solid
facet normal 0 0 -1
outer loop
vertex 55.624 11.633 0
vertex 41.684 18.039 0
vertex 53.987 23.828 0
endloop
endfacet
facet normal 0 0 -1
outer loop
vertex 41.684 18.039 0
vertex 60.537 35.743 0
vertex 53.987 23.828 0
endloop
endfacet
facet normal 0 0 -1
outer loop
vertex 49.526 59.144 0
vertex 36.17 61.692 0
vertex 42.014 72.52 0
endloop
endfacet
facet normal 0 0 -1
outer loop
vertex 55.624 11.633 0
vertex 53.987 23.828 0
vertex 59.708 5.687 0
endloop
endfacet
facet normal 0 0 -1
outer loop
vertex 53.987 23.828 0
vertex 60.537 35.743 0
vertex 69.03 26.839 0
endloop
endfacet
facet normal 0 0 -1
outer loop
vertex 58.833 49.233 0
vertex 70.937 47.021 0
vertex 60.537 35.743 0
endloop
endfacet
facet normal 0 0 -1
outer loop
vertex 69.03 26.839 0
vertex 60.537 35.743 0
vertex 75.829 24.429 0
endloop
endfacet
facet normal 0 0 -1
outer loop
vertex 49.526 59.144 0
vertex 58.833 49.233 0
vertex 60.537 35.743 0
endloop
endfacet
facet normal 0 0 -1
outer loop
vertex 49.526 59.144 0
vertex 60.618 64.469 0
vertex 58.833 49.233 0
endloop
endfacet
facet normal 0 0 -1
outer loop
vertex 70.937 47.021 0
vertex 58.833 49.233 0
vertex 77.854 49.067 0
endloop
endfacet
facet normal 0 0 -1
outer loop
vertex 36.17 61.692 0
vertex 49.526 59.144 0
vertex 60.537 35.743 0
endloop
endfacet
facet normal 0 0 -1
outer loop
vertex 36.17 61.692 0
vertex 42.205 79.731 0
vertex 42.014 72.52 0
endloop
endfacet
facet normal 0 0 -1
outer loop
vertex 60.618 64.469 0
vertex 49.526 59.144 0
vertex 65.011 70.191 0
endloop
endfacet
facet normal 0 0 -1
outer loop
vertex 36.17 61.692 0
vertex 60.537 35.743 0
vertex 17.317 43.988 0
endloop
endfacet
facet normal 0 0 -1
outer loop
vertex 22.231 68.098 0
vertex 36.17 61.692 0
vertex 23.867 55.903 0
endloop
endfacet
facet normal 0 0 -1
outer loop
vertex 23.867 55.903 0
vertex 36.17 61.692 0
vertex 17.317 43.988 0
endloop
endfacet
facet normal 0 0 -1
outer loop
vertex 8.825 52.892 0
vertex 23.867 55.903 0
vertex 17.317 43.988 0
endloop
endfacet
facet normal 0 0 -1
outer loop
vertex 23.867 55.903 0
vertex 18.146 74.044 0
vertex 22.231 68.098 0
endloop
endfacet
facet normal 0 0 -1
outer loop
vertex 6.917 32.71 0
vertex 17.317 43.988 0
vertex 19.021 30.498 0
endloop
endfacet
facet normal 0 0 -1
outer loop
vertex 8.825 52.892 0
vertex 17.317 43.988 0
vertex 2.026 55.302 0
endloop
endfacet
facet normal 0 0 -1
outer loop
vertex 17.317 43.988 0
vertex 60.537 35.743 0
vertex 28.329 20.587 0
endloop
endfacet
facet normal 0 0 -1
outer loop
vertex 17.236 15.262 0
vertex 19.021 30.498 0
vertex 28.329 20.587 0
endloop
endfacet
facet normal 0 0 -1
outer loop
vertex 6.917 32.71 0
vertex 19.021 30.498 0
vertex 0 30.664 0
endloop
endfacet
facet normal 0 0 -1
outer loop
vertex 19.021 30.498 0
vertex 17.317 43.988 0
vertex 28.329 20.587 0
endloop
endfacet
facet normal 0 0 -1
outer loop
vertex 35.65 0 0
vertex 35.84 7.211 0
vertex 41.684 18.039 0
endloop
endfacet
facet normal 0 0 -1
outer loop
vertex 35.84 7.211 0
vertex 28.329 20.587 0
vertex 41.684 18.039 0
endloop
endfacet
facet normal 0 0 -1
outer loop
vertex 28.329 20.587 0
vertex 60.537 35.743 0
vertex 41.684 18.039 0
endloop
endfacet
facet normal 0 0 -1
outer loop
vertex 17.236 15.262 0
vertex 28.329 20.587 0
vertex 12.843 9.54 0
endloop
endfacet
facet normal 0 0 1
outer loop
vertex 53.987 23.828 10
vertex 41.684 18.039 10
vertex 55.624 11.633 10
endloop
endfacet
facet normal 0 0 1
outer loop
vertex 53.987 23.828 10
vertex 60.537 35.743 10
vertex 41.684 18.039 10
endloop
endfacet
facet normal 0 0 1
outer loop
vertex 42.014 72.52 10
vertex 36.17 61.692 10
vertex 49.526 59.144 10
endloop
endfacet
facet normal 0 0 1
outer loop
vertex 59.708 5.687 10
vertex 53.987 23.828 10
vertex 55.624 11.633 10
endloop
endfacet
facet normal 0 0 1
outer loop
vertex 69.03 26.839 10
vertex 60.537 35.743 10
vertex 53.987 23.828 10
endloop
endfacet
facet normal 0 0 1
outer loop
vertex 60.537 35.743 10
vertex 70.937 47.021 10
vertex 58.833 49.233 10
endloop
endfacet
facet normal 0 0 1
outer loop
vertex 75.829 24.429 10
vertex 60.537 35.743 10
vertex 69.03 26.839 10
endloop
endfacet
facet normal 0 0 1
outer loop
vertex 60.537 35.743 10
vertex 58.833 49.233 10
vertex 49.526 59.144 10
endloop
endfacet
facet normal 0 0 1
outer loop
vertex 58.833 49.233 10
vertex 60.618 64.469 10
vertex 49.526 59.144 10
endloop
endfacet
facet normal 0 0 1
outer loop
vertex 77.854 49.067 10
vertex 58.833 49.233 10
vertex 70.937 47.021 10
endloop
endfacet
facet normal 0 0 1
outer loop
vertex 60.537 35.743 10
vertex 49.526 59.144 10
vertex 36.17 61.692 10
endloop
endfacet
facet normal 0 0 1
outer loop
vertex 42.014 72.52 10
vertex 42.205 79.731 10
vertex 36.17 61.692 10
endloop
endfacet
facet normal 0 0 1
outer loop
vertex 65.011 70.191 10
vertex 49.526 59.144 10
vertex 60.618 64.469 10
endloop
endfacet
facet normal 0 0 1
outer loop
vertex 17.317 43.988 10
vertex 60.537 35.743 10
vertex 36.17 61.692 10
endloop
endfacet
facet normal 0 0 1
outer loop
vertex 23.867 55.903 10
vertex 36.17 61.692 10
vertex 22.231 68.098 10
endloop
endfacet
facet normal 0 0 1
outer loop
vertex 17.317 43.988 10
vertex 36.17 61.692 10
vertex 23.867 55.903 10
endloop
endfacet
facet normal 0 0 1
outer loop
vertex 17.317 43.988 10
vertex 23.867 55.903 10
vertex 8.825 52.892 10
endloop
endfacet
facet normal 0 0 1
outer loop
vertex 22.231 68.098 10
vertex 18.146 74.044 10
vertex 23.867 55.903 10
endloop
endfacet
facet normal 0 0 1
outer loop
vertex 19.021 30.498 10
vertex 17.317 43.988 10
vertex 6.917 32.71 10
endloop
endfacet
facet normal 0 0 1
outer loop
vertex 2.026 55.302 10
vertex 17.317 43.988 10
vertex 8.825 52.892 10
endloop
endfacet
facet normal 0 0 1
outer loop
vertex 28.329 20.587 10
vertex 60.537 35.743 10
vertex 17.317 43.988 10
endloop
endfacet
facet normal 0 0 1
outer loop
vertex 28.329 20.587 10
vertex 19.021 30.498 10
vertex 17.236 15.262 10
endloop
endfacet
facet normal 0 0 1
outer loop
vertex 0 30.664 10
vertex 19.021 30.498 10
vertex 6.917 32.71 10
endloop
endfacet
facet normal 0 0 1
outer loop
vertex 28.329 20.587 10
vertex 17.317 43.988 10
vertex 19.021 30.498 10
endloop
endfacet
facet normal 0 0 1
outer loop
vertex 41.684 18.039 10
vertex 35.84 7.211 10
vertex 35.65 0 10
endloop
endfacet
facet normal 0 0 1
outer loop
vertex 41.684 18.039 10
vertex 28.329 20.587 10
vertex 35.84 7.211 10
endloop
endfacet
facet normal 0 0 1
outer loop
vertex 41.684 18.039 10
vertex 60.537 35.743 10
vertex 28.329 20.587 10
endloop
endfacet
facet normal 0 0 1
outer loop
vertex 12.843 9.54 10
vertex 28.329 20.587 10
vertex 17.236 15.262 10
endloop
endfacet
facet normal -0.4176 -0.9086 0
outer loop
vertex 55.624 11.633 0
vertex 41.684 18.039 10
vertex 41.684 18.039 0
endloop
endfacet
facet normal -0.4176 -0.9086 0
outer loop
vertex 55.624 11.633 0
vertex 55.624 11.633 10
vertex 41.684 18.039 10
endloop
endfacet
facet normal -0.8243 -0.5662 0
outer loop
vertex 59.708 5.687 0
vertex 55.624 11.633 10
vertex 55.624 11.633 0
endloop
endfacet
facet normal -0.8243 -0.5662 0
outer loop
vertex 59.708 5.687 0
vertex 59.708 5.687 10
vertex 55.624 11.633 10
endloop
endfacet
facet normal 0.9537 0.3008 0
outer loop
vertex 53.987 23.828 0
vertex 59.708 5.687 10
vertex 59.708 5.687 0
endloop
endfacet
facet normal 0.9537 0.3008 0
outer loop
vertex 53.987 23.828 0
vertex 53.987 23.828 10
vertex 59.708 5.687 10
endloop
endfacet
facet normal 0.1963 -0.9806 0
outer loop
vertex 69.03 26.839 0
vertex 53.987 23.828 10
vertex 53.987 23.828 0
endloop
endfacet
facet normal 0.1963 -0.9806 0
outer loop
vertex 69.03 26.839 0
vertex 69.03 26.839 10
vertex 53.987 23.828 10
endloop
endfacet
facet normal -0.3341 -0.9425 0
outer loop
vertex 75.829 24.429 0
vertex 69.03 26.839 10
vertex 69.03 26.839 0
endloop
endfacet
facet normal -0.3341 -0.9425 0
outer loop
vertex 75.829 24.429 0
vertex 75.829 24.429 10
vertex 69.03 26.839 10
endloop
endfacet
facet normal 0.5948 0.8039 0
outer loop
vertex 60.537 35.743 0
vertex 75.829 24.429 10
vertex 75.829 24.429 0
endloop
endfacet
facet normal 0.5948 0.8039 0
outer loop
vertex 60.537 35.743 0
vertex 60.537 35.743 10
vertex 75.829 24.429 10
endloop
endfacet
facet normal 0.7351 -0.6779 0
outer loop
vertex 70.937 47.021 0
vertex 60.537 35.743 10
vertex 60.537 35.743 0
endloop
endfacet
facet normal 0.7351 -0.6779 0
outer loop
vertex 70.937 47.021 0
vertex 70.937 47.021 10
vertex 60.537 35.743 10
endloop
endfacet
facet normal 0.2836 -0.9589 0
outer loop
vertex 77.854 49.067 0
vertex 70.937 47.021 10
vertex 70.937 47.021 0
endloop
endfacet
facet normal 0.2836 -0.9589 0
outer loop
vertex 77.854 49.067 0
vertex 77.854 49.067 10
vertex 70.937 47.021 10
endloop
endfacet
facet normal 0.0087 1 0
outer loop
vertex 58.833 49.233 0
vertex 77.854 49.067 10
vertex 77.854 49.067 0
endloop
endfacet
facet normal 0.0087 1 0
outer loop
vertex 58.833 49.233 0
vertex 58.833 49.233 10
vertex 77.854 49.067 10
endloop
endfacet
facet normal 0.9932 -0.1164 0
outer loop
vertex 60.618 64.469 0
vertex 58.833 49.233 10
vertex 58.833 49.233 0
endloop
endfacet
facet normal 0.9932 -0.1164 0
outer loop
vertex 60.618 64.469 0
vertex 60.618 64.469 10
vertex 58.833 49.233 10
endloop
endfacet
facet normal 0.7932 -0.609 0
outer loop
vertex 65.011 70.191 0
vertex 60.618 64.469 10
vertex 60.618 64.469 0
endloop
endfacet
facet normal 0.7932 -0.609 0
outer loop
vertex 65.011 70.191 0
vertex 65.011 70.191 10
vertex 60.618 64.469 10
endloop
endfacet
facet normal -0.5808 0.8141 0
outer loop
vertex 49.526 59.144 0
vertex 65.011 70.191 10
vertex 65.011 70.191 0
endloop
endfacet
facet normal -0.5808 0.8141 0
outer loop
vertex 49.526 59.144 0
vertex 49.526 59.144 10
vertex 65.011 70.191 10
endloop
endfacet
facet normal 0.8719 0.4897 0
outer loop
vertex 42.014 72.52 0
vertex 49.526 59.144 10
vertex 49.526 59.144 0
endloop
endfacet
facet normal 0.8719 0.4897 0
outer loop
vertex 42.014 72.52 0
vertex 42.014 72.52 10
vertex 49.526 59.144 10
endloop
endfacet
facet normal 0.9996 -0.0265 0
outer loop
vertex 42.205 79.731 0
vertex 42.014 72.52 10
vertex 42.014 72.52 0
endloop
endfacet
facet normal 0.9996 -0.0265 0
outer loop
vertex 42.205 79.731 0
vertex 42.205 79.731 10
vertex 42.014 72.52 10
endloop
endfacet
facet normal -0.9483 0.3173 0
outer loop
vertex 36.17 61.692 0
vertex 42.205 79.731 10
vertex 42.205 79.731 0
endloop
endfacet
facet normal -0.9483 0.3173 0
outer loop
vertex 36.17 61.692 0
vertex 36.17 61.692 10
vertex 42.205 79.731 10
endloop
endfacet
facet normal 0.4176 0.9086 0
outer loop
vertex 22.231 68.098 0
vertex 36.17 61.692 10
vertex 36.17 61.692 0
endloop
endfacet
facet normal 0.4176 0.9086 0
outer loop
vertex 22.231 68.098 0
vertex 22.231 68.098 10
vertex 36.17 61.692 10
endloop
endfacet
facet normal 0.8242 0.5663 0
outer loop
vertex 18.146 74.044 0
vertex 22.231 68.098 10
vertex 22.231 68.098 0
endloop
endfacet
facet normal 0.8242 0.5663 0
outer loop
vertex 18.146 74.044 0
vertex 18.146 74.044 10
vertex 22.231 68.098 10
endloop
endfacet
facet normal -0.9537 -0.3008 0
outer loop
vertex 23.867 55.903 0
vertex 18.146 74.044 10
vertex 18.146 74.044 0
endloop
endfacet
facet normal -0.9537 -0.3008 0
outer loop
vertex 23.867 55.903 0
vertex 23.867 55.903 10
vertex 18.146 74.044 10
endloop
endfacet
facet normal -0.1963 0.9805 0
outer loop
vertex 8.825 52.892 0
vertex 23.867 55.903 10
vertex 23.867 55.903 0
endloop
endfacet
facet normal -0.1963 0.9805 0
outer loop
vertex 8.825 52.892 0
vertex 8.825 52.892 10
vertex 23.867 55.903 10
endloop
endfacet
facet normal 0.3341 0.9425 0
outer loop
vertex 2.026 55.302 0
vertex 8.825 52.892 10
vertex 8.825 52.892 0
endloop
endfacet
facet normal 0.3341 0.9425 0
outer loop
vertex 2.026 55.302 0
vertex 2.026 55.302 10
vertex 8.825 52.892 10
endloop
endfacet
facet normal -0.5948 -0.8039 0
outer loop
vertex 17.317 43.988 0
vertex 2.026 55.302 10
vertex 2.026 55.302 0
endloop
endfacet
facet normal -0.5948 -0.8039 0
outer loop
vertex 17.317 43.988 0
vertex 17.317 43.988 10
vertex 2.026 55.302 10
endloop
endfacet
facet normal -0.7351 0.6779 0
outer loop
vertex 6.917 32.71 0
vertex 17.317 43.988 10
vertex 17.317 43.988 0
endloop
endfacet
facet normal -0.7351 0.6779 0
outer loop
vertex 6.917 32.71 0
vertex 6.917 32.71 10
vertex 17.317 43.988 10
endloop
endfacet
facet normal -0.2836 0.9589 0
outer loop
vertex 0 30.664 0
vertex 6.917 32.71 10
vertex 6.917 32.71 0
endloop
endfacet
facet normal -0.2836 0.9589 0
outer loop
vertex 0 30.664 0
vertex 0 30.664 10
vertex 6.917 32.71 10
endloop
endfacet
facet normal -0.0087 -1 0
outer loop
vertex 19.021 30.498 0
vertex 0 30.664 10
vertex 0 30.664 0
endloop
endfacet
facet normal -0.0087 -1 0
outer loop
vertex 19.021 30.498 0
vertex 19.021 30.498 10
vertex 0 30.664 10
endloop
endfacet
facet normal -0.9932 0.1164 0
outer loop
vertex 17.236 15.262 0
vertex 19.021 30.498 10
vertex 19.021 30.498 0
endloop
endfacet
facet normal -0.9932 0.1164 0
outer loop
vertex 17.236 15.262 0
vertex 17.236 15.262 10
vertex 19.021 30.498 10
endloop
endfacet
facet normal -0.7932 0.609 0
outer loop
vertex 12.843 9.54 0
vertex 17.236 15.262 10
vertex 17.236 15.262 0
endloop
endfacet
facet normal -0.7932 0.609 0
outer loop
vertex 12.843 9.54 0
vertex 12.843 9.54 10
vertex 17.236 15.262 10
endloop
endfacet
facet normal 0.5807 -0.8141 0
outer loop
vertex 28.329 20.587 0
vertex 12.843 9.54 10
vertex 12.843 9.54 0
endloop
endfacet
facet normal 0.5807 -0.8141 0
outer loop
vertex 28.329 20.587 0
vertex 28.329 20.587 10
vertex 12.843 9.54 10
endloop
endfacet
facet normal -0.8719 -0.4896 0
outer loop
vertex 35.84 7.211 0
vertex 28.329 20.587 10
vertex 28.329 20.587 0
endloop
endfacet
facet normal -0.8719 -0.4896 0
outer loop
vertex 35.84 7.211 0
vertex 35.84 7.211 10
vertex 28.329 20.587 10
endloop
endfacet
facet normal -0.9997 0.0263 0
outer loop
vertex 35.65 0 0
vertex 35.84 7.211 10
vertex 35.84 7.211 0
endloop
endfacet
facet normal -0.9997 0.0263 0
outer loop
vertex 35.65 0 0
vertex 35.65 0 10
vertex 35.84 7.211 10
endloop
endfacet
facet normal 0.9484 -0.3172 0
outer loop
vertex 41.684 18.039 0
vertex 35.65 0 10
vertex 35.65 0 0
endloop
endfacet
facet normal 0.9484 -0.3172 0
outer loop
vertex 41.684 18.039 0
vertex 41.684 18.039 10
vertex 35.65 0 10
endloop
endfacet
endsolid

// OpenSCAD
$fn = 32;

// ----------------------------------------------------------------------
// Fan rotor section: 10 blades, 22 mm hub radius, 18 mm blades
// ----------------------------------------------------------------------

// --- parameters (mm) ---
profile_height = 10;      // extrusion height
profile_points = 30;      // points of the closed outline

profile = [[60.537, 35.743], [70.937, 47.021], [77.854, 49.067], [58.833, 49.233], [60.618, 64.469], [65.011, 70.191], [49.526, 59.144], [42.014, 72.52], [42.205, 79.731], [36.17, 61.692], [22.231, 68.098], [18.146, 74.044], [23.867, 55.903], [8.825, 52.892], [2.026, 55.302], [17.317, 43.988], [6.917, 32.71], [0, 30.664], [19.021, 30.498], [17.236, 15.262], [12.843, 9.54], [28.329, 20.587], [35.84, 7.211], [35.65, 0], [41.684, 18.039], [55.624, 11.633], [59.708, 5.687], [53.987, 23.828], [69.03, 26.839], [75.829, 24.429]];  // single closed polygon, 30 points, counter clockwise

// --- the one profile operation ---
linear_extrude(height = profile_height) polygon(points = profile);
